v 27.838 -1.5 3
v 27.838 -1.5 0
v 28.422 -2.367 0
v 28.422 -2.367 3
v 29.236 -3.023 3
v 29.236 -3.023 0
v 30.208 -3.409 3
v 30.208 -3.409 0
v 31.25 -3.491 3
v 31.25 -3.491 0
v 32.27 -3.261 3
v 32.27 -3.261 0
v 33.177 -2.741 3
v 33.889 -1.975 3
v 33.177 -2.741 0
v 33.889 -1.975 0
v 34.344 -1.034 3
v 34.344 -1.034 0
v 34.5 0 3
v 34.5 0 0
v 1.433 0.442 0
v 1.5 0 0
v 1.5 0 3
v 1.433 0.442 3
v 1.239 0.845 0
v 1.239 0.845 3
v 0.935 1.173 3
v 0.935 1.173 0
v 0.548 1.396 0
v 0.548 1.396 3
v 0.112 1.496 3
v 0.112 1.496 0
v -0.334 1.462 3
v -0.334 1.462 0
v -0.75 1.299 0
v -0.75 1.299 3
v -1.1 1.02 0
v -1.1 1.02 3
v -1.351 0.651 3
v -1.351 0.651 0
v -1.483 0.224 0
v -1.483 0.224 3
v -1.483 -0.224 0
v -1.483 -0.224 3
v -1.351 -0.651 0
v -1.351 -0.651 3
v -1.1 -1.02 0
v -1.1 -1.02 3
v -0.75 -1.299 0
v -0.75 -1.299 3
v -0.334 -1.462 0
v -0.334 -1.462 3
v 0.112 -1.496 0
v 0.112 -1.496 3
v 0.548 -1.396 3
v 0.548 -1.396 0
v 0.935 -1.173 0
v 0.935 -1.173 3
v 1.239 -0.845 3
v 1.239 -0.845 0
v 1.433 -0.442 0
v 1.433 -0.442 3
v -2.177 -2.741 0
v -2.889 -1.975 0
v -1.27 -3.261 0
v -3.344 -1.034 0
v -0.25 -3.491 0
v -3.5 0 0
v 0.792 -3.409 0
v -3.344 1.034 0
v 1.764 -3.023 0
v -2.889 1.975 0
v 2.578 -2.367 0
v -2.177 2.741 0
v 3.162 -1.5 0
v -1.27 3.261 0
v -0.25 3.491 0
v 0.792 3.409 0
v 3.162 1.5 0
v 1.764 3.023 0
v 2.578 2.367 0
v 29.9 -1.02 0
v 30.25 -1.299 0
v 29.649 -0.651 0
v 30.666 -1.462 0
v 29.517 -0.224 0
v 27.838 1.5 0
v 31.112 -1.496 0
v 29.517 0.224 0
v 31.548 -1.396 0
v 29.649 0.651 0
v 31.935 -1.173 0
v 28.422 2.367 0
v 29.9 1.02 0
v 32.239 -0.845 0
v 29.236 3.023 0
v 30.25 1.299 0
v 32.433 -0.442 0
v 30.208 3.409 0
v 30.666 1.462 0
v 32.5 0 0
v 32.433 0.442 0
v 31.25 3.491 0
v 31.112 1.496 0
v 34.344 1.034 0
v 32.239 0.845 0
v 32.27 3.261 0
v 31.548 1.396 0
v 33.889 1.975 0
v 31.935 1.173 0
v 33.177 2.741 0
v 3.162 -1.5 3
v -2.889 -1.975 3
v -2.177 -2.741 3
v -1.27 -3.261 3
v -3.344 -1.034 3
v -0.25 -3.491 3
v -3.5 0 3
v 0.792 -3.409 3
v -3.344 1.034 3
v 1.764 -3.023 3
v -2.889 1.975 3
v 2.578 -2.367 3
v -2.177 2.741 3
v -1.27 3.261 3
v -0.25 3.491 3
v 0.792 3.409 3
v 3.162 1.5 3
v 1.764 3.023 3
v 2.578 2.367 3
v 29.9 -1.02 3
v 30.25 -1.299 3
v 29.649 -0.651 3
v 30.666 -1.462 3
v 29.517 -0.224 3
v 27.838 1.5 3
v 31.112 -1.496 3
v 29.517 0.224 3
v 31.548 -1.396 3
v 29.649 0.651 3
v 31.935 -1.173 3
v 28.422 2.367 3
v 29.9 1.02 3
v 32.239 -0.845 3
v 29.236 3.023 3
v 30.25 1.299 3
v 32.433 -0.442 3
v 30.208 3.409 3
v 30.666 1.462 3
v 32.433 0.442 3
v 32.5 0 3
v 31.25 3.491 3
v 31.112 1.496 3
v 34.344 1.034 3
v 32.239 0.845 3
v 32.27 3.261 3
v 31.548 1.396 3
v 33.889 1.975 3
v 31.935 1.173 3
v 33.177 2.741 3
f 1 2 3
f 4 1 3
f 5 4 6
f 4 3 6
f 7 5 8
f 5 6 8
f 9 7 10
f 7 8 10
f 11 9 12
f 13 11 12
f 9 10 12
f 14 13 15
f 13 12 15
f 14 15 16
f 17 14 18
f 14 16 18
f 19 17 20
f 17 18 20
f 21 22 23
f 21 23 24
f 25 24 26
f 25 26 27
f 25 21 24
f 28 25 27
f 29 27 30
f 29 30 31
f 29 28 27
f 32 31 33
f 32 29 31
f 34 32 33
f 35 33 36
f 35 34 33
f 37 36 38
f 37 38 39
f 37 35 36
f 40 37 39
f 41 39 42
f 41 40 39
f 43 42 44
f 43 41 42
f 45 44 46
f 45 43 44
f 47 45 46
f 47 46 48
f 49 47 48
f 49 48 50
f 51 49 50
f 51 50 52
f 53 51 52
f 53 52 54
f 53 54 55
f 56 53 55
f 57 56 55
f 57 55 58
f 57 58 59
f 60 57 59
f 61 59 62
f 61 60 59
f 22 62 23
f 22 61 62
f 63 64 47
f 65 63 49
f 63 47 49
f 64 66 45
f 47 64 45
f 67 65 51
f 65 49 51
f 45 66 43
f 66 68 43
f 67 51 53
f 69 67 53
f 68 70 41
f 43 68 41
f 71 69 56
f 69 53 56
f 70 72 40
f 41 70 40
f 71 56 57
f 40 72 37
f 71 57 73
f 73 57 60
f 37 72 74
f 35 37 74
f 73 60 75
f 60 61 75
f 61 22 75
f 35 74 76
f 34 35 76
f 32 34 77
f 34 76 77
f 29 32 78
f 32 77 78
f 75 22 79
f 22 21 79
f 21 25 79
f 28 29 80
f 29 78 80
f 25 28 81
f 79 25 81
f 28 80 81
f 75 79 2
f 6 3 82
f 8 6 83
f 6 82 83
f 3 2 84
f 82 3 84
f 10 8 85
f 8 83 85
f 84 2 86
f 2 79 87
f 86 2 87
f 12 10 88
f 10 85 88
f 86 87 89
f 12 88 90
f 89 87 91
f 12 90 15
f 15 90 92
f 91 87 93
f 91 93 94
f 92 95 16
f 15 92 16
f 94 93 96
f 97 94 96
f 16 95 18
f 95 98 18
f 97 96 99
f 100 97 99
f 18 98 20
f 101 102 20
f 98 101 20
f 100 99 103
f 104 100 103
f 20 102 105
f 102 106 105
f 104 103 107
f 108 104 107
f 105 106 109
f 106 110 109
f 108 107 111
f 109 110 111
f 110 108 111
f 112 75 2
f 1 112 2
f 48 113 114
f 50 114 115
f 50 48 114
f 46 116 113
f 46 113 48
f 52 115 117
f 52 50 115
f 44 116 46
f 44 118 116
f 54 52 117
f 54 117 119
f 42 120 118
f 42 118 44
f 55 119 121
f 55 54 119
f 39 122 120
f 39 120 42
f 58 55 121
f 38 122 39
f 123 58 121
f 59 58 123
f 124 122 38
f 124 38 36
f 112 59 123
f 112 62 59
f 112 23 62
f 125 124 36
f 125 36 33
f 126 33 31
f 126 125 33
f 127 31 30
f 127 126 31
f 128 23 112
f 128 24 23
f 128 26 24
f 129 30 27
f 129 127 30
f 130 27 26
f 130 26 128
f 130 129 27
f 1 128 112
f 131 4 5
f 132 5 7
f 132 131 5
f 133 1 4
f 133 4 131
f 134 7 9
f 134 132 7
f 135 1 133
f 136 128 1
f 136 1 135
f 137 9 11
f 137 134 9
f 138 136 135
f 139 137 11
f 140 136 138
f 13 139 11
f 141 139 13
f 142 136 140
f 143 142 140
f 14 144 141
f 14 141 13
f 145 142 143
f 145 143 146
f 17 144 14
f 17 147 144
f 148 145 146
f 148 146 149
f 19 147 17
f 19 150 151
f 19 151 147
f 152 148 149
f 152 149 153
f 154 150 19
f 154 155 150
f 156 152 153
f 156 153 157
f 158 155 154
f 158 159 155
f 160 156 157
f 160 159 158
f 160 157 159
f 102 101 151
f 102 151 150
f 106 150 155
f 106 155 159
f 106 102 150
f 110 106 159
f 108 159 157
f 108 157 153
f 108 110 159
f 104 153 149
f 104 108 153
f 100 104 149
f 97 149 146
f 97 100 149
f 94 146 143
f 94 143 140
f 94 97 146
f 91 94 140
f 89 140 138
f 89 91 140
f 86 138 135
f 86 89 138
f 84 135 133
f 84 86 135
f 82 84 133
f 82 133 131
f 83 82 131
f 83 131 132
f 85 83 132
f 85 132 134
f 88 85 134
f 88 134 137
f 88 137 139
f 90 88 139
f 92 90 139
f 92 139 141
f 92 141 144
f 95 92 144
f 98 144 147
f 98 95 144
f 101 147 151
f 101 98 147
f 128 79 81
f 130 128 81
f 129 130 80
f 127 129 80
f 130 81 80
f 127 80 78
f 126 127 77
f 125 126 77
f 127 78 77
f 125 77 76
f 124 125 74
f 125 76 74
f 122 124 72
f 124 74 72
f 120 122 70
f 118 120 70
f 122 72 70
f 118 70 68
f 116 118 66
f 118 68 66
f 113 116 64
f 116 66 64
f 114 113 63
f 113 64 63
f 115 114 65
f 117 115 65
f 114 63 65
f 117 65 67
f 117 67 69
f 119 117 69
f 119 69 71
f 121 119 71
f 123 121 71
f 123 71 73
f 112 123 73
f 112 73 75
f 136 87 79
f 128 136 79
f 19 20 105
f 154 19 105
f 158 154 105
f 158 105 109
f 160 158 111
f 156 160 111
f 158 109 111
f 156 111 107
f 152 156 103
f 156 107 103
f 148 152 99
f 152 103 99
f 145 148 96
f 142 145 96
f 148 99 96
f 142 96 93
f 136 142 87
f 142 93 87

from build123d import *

# Parameters (mm, degrees)
SKETCH_1_R      = 1.5
EXTRUDE_1_DEPTH = 3


with BuildPart() as part:
    # 草图1 → 凸台-拉伸1 (new body)
    with BuildSketch(Plane.XY):
        with BuildLine():
            ThreePointArc((3.16227766, 1.5), (-3.5, 0), (3.16227766, -1.5))
            Line((3.16227766, -1.5), (3.16227766, 1.5))
        make_face()
        Circle(SKETCH_1_R, mode=Mode.SUBTRACT)
        with BuildLine():
            ThreePointArc((3.5, 0), (3.414525722, -0.768774411), (3.16227766, -1.5))
            Line((3.16227766, -1.5), (27.83772234, -1.5))
            ThreePointArc((27.83772234, -1.5), (27.5, 0), (27.83772234, 1.5))
            Line((27.83772234, 1.5), (3.16227766, 1.5))
            ThreePointArc((3.16227766, 1.5), (3.414525722, 0.768774411), (3.5, 0))
        make_face()
        with BuildLine():
            Line((27.83772234, 1.5), (27.83772234, -1.5))
            ThreePointArc((27.83772234, -1.5), (31.768774411, -3.414525722), (34.5, 0))
            ThreePointArc((34.5, 0), (31.768774411, 3.414525722), (27.83772234, 1.5))
        make_face()
        with Locations((31, 0)):
            Circle(SKETCH_1_R, mode=Mode.SUBTRACT)
        with BuildLine():
            Line((3.16227766, 1.5), (3.16227766, -1.5))
            ThreePointArc((3.16227766, -1.5), (3.414525722, -0.768774411), (3.5, 0))
            ThreePointArc((3.5, 0), (3.414525722, 0.768774411), (3.16227766, 1.5))
        make_face()
        with BuildLine():
            ThreePointArc((27.83772234, 1.5), (27.5, 0), (27.83772234, -1.5))
            Line((27.83772234, -1.5), (27.83772234, 1.5))
        make_face()
    extrude(amount=EXTRUDE_1_DEPTH)


solid = part.part
